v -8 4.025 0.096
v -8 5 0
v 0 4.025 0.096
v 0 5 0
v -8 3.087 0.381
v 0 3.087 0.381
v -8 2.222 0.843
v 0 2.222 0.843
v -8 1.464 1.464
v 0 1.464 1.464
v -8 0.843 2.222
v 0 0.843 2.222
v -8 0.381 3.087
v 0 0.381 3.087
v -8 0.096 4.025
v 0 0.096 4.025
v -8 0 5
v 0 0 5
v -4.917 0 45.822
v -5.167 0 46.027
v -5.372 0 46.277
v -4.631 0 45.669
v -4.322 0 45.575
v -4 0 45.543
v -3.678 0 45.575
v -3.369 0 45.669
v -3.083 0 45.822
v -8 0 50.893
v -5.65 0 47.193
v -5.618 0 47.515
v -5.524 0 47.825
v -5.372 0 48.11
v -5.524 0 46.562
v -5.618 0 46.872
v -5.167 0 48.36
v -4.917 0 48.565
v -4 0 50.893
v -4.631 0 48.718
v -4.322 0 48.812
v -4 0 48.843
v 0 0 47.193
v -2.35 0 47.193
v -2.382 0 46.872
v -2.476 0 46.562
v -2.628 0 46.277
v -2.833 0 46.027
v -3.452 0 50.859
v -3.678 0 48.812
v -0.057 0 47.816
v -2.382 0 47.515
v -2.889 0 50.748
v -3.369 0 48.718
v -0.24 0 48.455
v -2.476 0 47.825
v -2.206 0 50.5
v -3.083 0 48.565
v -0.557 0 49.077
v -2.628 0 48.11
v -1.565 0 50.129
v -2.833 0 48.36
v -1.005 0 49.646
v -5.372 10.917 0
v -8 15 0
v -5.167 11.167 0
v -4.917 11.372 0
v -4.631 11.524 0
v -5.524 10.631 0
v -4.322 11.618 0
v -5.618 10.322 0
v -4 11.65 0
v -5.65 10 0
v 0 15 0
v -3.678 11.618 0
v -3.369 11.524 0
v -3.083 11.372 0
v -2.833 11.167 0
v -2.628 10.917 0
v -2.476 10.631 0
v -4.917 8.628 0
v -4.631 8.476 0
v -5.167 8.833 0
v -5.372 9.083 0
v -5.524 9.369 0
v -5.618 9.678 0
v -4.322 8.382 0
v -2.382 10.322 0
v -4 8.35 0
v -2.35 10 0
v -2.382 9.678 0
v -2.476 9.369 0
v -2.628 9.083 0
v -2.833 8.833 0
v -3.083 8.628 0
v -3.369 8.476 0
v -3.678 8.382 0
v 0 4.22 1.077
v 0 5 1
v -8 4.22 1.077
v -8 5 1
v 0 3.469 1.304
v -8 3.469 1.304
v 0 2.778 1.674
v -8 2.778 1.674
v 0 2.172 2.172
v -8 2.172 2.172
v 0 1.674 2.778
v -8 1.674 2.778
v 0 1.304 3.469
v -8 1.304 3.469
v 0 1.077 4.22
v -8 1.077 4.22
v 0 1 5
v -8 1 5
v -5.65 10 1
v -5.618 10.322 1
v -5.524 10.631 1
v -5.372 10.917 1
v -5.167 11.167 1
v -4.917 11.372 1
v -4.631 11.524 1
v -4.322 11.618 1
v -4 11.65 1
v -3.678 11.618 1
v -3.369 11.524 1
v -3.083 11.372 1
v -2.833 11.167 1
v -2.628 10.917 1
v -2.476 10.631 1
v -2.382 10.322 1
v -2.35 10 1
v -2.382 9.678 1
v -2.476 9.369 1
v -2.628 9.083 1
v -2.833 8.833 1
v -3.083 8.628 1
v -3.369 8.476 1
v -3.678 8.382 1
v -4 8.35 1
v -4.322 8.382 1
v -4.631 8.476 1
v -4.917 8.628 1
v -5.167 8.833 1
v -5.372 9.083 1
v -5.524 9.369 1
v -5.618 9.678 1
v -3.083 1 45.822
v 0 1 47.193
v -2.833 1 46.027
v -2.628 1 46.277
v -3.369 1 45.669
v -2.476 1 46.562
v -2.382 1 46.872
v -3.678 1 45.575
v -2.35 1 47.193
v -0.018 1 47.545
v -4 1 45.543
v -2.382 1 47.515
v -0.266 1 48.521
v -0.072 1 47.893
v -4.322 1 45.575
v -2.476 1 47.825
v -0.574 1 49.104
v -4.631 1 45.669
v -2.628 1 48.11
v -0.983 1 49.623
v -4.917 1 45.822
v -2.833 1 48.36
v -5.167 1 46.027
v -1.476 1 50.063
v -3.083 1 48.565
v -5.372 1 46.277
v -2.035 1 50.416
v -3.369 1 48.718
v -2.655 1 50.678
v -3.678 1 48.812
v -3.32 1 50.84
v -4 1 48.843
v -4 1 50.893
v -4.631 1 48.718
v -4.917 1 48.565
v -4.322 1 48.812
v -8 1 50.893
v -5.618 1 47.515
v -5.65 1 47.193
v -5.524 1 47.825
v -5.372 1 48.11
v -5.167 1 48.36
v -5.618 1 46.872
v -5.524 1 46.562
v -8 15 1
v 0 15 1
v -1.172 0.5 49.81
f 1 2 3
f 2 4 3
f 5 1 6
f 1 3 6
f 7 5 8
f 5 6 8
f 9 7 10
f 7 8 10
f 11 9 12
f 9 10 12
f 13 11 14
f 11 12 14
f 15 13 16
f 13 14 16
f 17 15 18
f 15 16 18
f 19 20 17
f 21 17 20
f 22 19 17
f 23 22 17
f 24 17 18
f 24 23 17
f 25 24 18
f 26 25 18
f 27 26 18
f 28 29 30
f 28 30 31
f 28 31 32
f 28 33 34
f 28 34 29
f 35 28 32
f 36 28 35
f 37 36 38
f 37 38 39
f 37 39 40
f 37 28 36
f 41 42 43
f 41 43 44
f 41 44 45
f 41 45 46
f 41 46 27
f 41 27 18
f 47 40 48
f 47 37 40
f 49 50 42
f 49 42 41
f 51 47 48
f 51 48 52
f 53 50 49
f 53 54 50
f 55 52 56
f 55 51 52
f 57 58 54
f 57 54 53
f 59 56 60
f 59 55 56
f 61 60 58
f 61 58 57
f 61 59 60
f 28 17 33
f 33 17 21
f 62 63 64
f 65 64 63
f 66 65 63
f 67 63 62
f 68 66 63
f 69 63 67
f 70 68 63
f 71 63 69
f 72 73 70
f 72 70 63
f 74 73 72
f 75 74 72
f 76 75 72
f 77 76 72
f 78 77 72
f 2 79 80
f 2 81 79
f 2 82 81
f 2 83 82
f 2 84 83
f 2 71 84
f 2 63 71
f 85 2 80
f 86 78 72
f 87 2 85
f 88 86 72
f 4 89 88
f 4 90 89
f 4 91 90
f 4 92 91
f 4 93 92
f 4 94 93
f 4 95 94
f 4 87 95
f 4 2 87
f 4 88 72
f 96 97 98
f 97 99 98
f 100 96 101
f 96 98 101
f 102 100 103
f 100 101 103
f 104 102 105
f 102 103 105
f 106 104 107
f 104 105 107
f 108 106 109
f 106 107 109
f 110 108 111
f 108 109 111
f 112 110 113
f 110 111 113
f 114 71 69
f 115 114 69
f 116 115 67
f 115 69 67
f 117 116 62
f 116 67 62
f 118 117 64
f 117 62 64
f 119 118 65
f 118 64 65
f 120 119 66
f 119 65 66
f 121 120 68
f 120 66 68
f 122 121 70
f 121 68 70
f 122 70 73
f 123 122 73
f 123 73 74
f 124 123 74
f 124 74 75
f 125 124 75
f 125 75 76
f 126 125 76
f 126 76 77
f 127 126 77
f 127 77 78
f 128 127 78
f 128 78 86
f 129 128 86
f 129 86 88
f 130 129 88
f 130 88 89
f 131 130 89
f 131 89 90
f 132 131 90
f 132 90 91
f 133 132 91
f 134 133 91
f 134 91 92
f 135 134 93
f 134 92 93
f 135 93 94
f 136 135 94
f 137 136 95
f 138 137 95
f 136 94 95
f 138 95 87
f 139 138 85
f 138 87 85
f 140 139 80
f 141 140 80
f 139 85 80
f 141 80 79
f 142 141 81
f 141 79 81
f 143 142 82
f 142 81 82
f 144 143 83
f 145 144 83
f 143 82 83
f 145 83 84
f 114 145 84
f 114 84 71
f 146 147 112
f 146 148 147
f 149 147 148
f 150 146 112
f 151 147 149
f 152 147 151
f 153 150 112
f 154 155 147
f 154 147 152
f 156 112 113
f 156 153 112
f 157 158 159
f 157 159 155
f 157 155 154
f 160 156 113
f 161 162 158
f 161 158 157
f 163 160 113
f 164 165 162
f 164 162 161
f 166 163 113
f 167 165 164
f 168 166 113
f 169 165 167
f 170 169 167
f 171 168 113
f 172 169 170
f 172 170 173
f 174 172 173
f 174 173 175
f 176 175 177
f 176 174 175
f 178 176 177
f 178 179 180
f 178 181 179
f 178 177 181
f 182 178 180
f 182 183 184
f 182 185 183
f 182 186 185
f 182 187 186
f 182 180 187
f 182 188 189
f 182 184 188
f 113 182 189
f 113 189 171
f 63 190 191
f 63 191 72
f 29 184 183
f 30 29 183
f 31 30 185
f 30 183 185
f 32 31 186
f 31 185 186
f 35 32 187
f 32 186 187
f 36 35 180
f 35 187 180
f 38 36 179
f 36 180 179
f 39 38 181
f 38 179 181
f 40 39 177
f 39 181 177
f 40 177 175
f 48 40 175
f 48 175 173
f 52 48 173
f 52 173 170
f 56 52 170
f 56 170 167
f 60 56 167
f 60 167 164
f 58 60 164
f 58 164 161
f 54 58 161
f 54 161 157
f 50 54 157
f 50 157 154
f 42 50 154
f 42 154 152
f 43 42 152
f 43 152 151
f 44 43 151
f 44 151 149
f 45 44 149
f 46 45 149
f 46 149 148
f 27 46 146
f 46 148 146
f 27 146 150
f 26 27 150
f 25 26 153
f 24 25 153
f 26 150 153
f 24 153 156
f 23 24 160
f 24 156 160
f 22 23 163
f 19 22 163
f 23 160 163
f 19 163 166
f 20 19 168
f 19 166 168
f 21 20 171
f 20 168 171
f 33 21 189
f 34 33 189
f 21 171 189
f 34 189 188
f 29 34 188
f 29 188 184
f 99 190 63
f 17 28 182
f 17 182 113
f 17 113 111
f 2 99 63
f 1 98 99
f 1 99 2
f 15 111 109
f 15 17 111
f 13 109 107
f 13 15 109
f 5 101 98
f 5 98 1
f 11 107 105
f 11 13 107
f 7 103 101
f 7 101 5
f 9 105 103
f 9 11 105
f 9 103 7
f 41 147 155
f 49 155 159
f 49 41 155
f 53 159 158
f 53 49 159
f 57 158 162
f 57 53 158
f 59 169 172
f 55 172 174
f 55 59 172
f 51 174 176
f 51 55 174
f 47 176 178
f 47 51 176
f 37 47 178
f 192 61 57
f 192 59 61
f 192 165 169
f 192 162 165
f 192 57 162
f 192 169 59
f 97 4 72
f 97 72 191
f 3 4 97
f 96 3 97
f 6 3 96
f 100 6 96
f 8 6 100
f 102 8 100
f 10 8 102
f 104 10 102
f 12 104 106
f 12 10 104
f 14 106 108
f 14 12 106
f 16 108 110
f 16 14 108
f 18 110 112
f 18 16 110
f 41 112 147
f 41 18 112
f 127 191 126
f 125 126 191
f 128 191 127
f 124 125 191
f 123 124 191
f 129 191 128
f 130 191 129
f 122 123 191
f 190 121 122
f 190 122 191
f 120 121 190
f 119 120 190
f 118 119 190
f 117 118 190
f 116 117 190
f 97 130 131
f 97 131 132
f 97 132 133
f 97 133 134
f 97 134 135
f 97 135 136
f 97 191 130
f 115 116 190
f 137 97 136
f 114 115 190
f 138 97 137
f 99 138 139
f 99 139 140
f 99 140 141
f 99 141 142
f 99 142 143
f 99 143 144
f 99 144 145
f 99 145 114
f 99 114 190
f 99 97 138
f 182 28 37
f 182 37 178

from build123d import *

# Parameters (mm, degrees)
F2_W     = 8
F2_H     = 1
F5_D     = 3.3
F7_D     = 3.3
F9_DEPTH = 15.001


with BuildPart() as f3:
    # F3: sweep along a path in F0
    with BuildLine(Plane.YZ) as f3_path:
        Line((15, 0), (5, 0))
        ThreePointArc((5, 0), (1.4644660941, 1.4644660941), (0, 5))
        Line((0, 5), (0, 50.8934259415))
    # F2 (on line) → F3 (sweep)
    with BuildSketch(Plane.XZ.offset(-15)):
        with Locations((-4, 0.5)):
            Rectangle(F2_W, F2_H)
    sweep(path=f3_path.line)

    # F5 (through all)
    with Locations(Plane.XY.offset(1)):
        with Locations((-4, 10)):
            Hole(F5_D / 2)

    # F7 (through all)
    with Locations(Plane.XZ):
        with Locations((-4, 47.1934259415)):
            Hole(F7_D / 2)

    # F8 (on face) → F9 (cut, through all)
    with BuildSketch(Plane.XZ):
        with BuildLine():
            add(Edge.make_bspline(
                [(0, 47.1934259415), (0, 50.8934259415), (-4, 50.8934259415)],
                knots=[0, 0, 0, 1.5707963268, 1.5707963268, 1.5707963268], degree=2, weights=[1, 0.7071067812, 1]))
            Line((0, 47.1934259415), (0, 50.8934259415))
            Line((0, 50.8934259415), (-4, 50.8934259415))
        make_face()
    extrude(amount=-F9_DEPTH, mode=Mode.SUBTRACT)


solid = f3.part
